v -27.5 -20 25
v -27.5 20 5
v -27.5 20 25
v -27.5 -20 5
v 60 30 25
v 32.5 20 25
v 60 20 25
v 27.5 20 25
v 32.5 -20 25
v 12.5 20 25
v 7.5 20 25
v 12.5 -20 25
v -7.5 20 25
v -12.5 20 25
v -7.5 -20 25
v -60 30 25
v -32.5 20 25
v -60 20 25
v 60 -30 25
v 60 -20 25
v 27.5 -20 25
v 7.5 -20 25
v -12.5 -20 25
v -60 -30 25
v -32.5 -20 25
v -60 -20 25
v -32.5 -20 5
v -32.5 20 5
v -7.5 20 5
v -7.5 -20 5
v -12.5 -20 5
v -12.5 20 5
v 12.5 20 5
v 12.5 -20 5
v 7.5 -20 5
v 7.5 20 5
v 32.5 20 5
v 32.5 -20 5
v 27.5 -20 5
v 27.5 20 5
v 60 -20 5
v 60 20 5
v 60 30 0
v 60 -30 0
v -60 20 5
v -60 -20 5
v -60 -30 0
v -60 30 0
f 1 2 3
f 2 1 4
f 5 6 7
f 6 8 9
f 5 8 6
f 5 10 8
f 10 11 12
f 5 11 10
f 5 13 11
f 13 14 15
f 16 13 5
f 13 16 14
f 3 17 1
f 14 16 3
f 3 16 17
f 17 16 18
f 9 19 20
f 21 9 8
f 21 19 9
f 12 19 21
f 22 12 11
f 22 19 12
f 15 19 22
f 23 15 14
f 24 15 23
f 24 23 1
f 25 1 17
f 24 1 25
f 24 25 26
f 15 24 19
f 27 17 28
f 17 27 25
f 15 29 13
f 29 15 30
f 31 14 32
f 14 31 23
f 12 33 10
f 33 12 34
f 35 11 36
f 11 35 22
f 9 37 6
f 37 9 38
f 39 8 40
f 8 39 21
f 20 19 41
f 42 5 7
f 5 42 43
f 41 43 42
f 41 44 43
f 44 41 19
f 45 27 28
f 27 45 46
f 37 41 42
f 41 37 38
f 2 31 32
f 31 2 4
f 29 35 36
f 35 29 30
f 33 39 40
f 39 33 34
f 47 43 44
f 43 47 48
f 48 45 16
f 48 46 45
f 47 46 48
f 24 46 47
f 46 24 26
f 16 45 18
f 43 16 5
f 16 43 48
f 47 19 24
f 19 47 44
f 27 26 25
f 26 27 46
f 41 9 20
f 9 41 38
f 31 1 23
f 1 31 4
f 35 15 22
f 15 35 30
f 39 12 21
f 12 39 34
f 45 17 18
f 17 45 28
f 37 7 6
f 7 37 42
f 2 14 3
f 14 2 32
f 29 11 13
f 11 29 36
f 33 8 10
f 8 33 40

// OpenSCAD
$fn = 32;

// ----------------------------------------------------------------------
// Rib frame 120 x 60 x 25
// 4 ribs at 20 mm pitch
// ----------------------------------------------------------------------

// --- parameters (mm) ---
frame = [120, 60, 5];  // base plate size (x, y, z)
rail_w = 10;           // side rail width
ribs = 4;              // number of ribs
rib_t = 5;             // rib thickness
rib_h = 20;            // rib height above the base plate
pitch = 20;            // pitch between rib centres

// --- derived feature positions (mm) ---
span = (ribs - 1) * pitch;          // = 60   distance between the outer ribs
origin_x = -span / 2;               // = -30   X of the first rib
rib_len = frame[1] - 2 * rail_w + 2;  // = 42   rib length, 1 mm into each rail
feature_centers = [
  [origin_x + 0 * pitch, 0],
  [origin_x + 1 * pitch, 0],
  [origin_x + 2 * pitch, 0],
  [origin_x + 3 * pitch, 0]
];   // rib centre line, drives the rib loop

// base plate, two side rails, then the ribs read straight off feature_centers
union() {
  translate([-frame[0] / 2, -frame[1] / 2, 0]) cube(frame);
  translate([-frame[0] / 2, -frame[1] / 2, 0]) cube([frame[0], rail_w, frame[2] + rib_h]);
  translate([-frame[0] / 2, frame[1] / 2 - rail_w, 0]) cube([frame[0], rail_w, frame[2] + rib_h]);
  for (centre = feature_centers)
    translate([centre[0] - rib_t / 2, centre[1] - rib_len / 2, frame[2] - 1])
      cube([rib_t, rib_len, rib_h + 1]);
}
